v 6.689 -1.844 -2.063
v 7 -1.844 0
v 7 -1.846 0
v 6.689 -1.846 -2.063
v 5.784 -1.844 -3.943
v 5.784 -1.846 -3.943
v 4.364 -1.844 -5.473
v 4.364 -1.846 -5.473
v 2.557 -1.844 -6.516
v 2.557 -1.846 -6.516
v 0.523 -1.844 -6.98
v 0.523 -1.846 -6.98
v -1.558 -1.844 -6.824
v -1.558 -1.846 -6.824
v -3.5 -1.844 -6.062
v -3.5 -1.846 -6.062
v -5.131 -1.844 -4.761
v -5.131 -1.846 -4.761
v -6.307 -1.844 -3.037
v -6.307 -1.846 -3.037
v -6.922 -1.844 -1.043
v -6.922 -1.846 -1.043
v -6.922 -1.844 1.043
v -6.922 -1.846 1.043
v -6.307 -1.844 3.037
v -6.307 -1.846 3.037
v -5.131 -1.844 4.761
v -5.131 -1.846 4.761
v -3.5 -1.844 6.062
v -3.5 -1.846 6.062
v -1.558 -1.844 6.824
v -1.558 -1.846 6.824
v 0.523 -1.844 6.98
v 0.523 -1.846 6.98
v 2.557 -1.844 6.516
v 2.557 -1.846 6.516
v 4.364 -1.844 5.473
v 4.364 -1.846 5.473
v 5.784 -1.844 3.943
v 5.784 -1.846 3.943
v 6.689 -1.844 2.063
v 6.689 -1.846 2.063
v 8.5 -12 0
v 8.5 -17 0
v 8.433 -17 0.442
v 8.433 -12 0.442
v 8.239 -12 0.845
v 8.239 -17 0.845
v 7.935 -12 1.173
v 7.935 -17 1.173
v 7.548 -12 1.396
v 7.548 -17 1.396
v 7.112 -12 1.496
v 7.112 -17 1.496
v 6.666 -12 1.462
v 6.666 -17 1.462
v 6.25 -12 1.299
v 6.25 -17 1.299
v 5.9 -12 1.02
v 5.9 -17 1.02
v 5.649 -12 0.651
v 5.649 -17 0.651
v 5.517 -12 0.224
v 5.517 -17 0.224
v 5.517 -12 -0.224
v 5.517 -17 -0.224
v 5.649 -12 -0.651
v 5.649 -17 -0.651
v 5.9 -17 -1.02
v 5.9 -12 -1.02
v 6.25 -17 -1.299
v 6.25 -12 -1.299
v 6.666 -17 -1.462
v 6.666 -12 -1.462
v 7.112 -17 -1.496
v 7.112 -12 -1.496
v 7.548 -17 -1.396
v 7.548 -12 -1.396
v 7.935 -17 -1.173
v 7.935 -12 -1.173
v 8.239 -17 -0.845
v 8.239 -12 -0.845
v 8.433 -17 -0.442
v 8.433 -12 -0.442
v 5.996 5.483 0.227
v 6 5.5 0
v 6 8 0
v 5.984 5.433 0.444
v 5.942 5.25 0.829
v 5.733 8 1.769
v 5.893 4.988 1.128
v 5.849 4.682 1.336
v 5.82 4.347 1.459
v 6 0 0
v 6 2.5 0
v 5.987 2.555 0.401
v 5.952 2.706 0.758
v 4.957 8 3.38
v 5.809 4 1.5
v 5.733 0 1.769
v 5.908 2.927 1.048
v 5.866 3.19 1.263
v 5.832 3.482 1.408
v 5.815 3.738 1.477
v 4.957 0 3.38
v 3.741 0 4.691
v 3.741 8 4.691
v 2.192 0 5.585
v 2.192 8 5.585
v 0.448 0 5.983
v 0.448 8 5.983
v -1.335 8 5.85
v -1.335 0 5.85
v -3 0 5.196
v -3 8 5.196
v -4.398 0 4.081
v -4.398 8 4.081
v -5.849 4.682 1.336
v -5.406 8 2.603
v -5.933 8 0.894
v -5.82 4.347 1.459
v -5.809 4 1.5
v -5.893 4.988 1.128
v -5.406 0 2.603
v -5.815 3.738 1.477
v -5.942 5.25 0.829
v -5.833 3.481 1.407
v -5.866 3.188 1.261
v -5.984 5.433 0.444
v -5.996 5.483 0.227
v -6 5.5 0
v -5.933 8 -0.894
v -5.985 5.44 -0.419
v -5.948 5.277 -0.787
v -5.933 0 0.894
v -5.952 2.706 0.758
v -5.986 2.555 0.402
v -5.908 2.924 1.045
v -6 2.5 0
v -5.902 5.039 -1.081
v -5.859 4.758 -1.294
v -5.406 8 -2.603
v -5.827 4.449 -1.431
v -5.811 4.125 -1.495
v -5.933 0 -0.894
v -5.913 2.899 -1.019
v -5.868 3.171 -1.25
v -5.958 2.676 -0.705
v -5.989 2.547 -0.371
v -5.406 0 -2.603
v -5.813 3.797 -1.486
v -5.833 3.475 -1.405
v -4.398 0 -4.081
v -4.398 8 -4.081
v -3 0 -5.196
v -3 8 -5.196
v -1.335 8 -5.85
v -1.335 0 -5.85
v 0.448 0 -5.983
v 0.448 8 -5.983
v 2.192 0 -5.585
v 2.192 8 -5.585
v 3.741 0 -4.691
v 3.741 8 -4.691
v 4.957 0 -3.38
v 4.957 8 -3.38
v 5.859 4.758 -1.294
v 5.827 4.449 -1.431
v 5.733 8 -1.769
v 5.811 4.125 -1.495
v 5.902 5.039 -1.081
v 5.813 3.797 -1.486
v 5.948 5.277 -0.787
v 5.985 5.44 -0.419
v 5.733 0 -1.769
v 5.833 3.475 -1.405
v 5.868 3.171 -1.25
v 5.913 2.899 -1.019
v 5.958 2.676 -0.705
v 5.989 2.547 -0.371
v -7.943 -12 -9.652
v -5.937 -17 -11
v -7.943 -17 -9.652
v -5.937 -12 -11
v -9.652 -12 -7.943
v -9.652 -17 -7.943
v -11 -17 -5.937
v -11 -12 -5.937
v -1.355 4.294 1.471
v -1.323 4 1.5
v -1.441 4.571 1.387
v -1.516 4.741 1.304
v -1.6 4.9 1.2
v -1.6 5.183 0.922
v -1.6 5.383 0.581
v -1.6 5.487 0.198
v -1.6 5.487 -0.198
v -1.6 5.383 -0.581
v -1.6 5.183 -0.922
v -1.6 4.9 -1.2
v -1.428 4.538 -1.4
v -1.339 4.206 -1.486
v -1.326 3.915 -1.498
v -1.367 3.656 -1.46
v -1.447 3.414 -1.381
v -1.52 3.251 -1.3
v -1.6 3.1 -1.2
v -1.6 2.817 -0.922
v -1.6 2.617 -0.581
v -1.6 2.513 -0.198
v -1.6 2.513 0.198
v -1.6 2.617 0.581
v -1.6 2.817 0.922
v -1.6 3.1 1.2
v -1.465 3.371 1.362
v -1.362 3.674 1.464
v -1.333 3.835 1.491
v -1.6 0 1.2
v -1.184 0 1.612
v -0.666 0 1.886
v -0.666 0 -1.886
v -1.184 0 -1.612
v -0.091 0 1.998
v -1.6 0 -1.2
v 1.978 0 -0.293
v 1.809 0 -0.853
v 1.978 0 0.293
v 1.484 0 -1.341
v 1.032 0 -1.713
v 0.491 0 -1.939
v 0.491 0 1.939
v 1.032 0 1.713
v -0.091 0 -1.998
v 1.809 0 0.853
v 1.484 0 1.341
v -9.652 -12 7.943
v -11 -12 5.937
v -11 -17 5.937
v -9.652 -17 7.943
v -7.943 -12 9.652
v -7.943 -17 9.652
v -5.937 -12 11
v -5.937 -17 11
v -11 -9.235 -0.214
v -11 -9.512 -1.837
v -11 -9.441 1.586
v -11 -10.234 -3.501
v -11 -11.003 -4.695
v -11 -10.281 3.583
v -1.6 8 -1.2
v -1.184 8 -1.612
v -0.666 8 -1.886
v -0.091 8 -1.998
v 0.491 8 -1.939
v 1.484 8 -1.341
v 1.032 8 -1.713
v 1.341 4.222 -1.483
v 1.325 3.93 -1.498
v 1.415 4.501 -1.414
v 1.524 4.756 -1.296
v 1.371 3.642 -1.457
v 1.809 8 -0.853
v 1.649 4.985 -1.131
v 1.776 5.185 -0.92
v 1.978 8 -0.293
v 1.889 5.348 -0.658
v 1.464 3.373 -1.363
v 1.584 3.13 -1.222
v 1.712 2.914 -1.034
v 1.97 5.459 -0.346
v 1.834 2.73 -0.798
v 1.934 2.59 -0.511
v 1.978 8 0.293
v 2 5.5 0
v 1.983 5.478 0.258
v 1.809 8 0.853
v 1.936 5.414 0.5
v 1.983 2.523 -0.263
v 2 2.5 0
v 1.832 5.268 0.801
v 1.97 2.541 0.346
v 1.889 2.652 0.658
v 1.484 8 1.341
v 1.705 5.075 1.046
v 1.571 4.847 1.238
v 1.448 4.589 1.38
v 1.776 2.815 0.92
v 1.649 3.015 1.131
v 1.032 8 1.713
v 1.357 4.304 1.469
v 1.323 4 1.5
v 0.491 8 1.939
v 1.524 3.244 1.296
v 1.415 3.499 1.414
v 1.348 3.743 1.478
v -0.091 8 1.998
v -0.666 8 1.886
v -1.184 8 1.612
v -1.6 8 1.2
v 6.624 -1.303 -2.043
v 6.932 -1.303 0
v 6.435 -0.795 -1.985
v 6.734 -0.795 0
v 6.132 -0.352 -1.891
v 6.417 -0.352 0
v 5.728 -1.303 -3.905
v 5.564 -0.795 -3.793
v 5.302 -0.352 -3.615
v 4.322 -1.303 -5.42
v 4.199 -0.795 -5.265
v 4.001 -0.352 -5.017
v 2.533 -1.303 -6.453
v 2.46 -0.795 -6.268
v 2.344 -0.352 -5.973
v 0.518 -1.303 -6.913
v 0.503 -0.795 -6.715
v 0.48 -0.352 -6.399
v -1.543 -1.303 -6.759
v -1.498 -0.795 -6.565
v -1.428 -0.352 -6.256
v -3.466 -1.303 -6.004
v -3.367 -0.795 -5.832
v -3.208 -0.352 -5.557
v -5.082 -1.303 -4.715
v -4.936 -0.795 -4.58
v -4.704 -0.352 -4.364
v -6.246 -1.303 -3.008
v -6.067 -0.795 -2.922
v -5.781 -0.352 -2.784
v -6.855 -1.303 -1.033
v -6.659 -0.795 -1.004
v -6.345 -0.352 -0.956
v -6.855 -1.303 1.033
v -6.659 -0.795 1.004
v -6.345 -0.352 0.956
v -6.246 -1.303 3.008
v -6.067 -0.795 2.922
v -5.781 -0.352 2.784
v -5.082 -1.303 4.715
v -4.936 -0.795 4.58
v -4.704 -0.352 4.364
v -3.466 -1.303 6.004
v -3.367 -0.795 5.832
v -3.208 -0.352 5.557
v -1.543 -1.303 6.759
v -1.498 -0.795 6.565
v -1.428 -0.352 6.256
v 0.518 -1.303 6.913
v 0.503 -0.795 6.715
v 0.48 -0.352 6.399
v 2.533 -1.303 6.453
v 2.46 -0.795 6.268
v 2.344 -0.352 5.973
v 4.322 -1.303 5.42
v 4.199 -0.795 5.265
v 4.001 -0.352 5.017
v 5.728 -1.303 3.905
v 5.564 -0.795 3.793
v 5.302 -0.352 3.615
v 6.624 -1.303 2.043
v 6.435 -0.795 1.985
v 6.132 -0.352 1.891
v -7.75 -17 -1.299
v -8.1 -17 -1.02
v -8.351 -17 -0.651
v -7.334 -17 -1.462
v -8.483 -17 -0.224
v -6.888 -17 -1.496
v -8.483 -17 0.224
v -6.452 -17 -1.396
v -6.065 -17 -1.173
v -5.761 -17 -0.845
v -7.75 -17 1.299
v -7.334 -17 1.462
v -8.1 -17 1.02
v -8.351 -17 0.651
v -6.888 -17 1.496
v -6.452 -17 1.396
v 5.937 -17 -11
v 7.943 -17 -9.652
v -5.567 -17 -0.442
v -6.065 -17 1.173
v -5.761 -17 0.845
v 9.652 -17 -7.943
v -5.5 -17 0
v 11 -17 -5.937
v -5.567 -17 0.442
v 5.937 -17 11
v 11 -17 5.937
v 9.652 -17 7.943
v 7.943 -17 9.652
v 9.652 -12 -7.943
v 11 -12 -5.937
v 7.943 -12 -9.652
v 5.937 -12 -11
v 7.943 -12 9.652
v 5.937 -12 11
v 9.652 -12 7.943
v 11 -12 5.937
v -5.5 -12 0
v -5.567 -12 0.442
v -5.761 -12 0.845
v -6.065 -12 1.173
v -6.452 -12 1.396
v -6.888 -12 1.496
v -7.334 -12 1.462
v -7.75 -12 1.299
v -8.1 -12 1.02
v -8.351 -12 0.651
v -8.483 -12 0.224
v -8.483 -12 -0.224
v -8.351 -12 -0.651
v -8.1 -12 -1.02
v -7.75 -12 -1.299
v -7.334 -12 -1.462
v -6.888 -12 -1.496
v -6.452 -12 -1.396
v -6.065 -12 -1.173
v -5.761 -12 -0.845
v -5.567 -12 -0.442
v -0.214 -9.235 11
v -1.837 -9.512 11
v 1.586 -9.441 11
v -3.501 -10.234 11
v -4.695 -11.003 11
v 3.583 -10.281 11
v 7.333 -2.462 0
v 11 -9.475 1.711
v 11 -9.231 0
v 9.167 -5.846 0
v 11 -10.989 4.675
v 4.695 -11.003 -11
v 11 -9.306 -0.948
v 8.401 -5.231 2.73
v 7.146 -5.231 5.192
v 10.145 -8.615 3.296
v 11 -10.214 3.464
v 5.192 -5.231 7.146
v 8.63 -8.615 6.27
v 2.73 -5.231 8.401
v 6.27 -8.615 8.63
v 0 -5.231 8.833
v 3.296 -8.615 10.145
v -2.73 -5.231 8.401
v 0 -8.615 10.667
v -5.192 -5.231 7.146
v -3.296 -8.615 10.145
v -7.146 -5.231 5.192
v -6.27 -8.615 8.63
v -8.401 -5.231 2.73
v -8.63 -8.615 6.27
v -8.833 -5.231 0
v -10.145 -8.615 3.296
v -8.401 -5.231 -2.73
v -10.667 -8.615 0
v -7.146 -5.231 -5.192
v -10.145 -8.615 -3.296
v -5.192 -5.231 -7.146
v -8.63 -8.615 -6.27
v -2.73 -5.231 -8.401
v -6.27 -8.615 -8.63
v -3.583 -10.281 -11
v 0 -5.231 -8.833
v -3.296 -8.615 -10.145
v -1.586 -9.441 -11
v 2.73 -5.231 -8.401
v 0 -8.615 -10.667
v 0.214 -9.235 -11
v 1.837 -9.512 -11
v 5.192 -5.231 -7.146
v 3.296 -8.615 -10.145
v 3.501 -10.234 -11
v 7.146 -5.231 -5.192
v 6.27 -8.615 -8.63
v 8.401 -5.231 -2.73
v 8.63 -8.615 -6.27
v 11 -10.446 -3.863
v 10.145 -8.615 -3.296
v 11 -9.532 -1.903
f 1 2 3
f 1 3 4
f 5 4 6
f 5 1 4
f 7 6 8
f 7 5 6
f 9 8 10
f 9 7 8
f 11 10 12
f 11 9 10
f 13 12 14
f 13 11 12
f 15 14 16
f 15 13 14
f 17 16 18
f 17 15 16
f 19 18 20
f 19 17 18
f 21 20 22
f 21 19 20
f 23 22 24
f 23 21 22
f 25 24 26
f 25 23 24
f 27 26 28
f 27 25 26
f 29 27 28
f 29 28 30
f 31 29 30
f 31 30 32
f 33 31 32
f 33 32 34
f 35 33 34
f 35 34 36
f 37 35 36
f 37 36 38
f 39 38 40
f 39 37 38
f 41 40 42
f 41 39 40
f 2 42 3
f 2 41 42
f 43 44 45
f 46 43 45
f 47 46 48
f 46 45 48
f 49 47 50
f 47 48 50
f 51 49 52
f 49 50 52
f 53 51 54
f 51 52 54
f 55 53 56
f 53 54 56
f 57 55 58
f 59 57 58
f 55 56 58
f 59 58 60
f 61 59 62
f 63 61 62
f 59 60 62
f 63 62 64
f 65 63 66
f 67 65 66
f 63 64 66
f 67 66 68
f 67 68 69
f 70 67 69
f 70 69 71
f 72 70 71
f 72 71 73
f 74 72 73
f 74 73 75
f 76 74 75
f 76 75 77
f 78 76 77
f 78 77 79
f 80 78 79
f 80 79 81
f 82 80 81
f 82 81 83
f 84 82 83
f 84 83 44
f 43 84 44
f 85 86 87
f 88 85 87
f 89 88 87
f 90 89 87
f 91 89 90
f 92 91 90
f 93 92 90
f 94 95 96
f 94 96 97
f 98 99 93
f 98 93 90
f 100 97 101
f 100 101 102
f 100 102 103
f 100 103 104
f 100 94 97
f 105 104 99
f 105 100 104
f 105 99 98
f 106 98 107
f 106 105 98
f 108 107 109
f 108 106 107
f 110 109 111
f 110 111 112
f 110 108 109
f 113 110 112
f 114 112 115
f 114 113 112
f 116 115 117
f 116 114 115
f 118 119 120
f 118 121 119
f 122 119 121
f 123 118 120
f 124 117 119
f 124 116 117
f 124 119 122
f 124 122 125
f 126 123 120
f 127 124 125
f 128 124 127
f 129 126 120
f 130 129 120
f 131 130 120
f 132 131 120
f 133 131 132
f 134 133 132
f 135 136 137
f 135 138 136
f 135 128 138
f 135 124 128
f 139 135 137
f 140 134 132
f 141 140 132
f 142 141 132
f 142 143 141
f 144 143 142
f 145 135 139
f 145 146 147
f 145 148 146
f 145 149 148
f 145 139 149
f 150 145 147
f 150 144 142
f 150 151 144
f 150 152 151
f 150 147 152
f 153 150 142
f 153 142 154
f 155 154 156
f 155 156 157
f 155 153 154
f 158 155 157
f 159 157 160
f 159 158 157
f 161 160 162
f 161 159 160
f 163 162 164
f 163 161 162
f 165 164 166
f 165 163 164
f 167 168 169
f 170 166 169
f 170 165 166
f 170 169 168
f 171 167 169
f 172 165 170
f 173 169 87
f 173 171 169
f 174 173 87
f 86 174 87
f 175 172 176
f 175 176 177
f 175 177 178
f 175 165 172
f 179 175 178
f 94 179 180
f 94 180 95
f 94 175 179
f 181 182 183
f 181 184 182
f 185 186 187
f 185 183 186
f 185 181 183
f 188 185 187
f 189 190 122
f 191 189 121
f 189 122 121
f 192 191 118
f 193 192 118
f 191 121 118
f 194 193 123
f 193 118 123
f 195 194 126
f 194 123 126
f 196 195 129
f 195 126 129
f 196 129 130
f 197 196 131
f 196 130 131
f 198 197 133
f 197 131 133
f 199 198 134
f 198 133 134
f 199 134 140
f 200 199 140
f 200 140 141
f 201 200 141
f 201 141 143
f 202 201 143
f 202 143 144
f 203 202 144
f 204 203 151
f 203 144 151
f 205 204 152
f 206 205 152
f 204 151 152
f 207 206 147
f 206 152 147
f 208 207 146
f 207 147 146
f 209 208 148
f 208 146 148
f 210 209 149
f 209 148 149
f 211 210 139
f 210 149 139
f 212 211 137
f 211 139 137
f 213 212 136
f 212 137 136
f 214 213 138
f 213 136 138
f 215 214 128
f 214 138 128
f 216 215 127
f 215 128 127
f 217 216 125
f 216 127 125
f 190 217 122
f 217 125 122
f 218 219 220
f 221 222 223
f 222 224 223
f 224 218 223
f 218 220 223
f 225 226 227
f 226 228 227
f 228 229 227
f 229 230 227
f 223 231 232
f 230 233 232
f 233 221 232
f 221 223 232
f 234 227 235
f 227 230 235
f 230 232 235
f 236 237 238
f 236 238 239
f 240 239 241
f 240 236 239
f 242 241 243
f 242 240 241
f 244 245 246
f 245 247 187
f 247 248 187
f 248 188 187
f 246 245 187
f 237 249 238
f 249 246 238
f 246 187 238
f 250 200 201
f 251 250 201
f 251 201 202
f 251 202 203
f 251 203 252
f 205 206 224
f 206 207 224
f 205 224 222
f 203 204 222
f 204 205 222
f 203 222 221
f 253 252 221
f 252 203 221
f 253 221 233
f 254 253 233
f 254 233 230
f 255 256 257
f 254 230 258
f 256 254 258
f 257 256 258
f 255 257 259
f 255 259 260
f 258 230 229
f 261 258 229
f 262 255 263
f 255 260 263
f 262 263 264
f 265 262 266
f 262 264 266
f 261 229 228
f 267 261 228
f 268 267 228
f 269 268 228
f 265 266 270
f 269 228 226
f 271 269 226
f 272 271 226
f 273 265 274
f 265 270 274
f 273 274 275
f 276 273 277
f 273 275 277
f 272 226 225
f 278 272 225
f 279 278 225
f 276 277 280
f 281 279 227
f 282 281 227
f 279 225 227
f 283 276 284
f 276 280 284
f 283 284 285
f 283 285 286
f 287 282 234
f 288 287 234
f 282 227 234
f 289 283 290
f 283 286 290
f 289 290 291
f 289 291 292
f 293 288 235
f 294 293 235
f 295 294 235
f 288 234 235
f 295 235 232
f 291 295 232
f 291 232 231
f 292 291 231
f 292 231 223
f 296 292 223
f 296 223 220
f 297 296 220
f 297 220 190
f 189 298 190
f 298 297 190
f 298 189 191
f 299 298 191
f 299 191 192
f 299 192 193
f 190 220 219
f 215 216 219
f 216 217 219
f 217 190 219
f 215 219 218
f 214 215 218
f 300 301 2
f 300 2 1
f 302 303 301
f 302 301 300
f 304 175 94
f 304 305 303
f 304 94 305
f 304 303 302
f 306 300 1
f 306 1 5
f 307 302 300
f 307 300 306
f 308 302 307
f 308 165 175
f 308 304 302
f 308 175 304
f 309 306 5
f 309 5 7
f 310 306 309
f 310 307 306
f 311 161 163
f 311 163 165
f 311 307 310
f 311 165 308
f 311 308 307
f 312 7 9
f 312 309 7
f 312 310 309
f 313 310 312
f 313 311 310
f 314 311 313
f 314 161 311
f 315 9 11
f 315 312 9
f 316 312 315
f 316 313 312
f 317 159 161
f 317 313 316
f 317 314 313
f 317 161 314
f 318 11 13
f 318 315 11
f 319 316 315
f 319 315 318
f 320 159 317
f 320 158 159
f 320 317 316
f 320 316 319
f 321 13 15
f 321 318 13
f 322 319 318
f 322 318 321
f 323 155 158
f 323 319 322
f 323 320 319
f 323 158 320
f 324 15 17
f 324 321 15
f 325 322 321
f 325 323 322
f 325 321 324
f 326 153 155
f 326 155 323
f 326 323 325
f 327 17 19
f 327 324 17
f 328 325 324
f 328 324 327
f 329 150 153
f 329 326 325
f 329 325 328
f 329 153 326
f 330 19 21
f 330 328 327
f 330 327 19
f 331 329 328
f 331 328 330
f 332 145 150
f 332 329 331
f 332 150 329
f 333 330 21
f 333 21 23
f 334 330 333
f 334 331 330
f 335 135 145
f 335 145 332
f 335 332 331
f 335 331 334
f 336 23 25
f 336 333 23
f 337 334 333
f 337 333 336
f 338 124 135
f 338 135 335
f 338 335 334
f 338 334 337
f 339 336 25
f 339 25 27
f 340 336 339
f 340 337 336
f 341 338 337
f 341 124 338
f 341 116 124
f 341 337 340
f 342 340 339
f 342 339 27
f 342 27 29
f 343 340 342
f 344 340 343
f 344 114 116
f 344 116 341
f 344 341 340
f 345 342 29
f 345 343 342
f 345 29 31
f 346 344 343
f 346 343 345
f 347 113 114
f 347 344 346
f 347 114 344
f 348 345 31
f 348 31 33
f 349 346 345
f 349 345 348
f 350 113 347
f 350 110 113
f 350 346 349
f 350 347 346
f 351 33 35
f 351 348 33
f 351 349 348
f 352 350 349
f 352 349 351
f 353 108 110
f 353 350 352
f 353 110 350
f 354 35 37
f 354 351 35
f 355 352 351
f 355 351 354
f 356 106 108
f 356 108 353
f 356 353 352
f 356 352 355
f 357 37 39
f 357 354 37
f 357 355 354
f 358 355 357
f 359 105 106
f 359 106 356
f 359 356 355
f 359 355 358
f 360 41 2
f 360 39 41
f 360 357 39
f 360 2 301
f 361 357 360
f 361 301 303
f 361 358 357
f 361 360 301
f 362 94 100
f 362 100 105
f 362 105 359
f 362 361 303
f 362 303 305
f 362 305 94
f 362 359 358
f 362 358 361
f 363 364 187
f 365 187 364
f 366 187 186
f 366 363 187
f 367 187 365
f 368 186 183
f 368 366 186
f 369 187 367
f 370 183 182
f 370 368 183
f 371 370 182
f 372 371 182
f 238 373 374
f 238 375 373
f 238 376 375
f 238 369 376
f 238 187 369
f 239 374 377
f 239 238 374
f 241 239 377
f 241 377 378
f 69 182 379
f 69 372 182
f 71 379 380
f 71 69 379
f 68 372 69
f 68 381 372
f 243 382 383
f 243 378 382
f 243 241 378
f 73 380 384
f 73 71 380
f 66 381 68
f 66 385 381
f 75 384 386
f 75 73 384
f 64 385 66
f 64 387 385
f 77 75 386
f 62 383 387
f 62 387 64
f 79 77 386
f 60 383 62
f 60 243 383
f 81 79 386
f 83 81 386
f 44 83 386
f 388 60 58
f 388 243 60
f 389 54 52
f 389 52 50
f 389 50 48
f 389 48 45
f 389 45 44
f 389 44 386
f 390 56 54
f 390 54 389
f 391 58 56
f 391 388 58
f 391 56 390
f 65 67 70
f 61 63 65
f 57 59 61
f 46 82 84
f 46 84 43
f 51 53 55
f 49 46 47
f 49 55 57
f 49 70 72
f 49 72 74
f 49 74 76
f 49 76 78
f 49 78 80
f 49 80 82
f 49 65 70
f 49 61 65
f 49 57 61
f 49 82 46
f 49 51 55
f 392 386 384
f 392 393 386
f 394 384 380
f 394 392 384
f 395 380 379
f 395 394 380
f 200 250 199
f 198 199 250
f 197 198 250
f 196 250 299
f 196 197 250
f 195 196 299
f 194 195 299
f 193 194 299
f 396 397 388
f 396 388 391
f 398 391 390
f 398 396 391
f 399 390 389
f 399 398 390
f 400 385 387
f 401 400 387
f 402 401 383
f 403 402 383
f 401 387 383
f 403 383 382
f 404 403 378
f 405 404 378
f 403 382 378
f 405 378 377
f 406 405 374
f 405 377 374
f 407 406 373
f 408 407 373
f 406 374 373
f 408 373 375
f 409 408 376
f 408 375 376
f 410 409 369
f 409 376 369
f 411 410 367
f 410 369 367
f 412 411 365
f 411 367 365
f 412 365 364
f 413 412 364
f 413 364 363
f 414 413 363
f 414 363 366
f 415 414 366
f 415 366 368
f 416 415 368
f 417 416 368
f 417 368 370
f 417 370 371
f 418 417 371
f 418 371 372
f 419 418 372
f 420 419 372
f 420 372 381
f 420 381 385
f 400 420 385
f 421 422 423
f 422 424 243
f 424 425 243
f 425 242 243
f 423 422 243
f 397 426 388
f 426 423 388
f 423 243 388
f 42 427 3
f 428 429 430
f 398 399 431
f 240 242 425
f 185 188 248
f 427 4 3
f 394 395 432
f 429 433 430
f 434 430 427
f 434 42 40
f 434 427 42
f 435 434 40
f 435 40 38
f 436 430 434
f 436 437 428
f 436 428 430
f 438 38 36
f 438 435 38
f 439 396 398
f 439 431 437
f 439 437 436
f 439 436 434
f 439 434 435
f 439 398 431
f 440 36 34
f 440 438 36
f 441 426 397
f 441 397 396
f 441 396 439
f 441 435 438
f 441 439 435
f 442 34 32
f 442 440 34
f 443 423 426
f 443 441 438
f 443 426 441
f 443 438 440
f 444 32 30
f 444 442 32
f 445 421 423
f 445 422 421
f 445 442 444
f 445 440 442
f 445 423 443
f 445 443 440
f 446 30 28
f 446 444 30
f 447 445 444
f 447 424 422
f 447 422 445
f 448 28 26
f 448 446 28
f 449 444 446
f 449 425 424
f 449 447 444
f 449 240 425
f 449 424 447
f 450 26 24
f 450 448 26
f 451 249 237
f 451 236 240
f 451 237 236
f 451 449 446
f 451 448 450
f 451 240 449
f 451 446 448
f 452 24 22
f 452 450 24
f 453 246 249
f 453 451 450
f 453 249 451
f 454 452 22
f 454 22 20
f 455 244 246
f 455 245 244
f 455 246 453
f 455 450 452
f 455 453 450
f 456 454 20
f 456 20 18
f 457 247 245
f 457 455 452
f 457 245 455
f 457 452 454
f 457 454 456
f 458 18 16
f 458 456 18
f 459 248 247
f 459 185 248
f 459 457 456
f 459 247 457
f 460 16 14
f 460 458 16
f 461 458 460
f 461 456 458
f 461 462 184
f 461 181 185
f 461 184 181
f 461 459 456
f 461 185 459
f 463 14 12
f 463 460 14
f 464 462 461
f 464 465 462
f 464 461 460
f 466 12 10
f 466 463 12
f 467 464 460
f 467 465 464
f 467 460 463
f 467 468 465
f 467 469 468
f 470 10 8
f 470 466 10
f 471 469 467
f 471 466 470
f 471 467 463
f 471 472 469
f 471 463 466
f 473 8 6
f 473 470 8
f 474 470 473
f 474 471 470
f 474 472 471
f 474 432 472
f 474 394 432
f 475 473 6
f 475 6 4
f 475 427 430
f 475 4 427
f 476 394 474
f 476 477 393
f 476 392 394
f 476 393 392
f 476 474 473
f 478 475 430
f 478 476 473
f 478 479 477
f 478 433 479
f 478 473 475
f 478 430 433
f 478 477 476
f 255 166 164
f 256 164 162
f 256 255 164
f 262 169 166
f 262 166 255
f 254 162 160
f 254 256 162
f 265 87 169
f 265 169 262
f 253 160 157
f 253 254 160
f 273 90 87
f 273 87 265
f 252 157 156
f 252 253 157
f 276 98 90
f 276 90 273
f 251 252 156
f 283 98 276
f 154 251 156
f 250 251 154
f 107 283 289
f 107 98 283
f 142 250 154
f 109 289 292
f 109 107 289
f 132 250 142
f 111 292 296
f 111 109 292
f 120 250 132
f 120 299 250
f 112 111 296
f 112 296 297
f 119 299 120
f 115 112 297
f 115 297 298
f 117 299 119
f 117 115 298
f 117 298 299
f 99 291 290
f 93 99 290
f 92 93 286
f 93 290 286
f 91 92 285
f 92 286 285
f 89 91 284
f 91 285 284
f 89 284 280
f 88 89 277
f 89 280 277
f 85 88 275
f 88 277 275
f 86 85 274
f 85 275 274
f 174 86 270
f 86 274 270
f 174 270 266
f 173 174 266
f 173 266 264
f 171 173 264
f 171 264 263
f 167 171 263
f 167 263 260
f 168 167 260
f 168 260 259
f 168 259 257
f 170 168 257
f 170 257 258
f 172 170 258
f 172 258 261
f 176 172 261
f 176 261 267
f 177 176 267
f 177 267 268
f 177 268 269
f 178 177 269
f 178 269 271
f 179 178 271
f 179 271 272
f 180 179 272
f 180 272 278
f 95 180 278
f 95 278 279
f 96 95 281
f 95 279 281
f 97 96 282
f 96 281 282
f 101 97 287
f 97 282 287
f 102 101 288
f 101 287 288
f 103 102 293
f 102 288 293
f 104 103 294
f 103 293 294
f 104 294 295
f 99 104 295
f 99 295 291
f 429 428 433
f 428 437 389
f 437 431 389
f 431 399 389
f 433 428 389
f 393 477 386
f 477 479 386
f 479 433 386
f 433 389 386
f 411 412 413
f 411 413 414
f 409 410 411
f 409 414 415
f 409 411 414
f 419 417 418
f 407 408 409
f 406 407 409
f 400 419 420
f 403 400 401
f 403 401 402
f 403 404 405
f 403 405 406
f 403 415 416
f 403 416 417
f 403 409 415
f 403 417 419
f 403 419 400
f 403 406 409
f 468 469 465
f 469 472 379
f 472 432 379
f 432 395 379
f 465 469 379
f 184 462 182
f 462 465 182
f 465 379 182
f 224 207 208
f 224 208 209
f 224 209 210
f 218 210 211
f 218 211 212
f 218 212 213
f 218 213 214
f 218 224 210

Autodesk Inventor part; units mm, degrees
ref_plane "YZ Plane" through (0, 0, 0) normal (1, 0, 0) x (0, 1, 0)
ref_plane "XZ Plane" through (0, 0, 0) normal (0, 1, 0) x (-1, 0, 0)
ref_plane "XY Plane" through (0, 0, 0) normal (0, 0, 1) x (1, 0, 0)
sketch "Szkic2" plane through (0, 0, 0) normal (0, 1, 0) x (-1, 0, 0)
  line L0 (-6, 6) -> (6, 6)
  line L1 (6, 6) -> (6, -6)
  line L2 (6, -6) -> (-6, -6)
  line L3 (-6, -6) -> (-6, 6)
  line L4 (-6, 6) -> (6, -6) construction
  line L5 (6, 6) -> (-6, -6) construction
  point P0 (0, 0)
  dimension "d3" = 12
  dimension "d4" = 12
extrude "Wyciągnięcie proste1" add sketch "Szkic2" along normal blind 8
sketch "Szkic5" plane through (-6, 0, -6) normal (-1, 0, 0) x (0, 0, 1)
  line L0 (0, 8) -> (12, 8) projected
  line L1 (6, 8) -> (6, 0)
  line L2 (6, 0) -> (6, 8)
  line L3 (6, 8) -> (6, 4)
  circle A0 centre (6, 4) radius 1.5
  dimension "d10" = 4
  dimension "d11" = 3
extrude "Wyciągnięcie proste2" cut sketch "Szkic5" against normal through all
thread "Gwint1" size "M3x0.5" class "6H" standard "ANSI Metric M Profile" full length
sketch "Szkic6" plane through (0, 0, 0) normal (0, -1, 0) x (1, 0, 0)
  circle A0 centre (0, 0) radius 6
  circle A1 centre (0, 0) radius 8
  circle A2 centre (0, 0) radius 2
  line L0 (0, 0) -> (2, 0)
  line L1 (0, 0) -> (-1.6, 0)
  line L2 (-1.6, 0) -> (-1.6, -1.2)
  line L3 (-1.6, 0) -> (-1.6, 1.2)
  line L4 (-6, 6) -> (6, 6) projected
  circle A3 centre (0, 0) radius 8.4853
  point P0 (-5.2915, 6)
  point P1 (5.2915, 6)
  point P2 (0, 6)
extrude "Wyciągnięcie proste3" cut sketch "Szkic6" against normal blind 8 contours L4 A1 | L4 A3 A1 | A1 L4 A3 | L0 L1 L3 A2 | A2 L2 L1 L0 picked at (7.1897, -1.149)
sketch "Szkic11" plane through (0, 0, 0) normal (0, -1, 0) x (1, 0, 0)
  circle A0 centre (0, 0) radius 6
  circle A1 centre (0, 0) radius 7
  dimension "d24" = 14
extrude "Wyciągnięcie proste4" add sketch "Szkic11" along normal blind 12 contours A0 | A1
sketch "Szkic18" plane through (0, -12, 0) normal (0, -1, 0) x (1, 0, 0)
  arc A0 (-1.6, -1.2) -> (-1.6, 1.2) centre (0, 0) ccw projected
  circle A1 centre (0, 0) radius 12.5
  dimension "d35" = 25
loft "Wyciągnięcie złożone2" add profiles "Szkic18" section 2 edges at (0, 0, -6)
sketch "Szkic19" plane through (0, -12, 0) normal (0, -1, 0) x (1, 0, 0)
  circle A0 centre (0, 0) radius 12.5
sketch "Szkic20" plane through (0, -12, 0) normal (0, -1, 0) x (1, 0, 0)
  point P0 (0, 0)
extrude "Wyciągnięcie proste6" add sketch "Szkic19" along normal blind 5
sketch "Szkic21" plane through (0, -17, 0) normal (0, -1, 0) x (1, 0, 0)
  line L0 (-11, 11) -> (11, 11)
  line L1 (11, 11) -> (11, -11)
  line L2 (11, -11) -> (-11, -11)
  line L3 (-11, -11) -> (-11, 11)
  circle A0 centre (0, 0) radius 6 projected
  line L4 (-11, 11) -> (11, -11) construction
  line L5 (11, 11) -> (-11, -11) construction
  circle A1 centre (0, 0) radius 12.5
  point P0 (5.9372, 11)
  point P1 (-5.9372, 11)
  point P2 (11, 5.9372)
  point P3 (11, -5.9372)
  point P4 (-11, 5.9372)
  point P5 (-11, -5.9372)
  point P6 (-5.9372, -11)
  point P7 (5.9372, -11)
  dimension "d42" = 22
  dimension "d43" = 22
extrude "Wyciągnięcie proste7" cut sketch "Szkic21" against normal through all contours A1 L0 | L3 A1 | A1 L1 | L2 A1
sketch "Szkic22" plane through (0, -17, 0) normal (0, -1, 0) x (1, 0, 0)
  line L0 (0, 0) -> (-7, 0)
  line L1 (0, 0) -> (7, 0)
  circle A0 centre (-7, 0) radius 1.5
  circle A1 centre (7, 0) radius 1.5
  dimension "d46" = 7
  dimension "d47" = 7
  dimension "d48" = 3
  dimension "d49" = 3
extrude "Wyciągnięcie proste8" cut sketch "Szkic22" against normal blind 5
thread "Gwint2" size "M3x0.5" class "6H" standard "ANSI Metric M Profile" full length
thread "Gwint3" size "M3x0.5" class "6H" standard "ANSI Metric M Profile" full length
fillet "Zaokrąglenie1" radius 2.2 1 edges at (-7, 0, 0)
properties part number "MocowanieChwytakaElement1"
